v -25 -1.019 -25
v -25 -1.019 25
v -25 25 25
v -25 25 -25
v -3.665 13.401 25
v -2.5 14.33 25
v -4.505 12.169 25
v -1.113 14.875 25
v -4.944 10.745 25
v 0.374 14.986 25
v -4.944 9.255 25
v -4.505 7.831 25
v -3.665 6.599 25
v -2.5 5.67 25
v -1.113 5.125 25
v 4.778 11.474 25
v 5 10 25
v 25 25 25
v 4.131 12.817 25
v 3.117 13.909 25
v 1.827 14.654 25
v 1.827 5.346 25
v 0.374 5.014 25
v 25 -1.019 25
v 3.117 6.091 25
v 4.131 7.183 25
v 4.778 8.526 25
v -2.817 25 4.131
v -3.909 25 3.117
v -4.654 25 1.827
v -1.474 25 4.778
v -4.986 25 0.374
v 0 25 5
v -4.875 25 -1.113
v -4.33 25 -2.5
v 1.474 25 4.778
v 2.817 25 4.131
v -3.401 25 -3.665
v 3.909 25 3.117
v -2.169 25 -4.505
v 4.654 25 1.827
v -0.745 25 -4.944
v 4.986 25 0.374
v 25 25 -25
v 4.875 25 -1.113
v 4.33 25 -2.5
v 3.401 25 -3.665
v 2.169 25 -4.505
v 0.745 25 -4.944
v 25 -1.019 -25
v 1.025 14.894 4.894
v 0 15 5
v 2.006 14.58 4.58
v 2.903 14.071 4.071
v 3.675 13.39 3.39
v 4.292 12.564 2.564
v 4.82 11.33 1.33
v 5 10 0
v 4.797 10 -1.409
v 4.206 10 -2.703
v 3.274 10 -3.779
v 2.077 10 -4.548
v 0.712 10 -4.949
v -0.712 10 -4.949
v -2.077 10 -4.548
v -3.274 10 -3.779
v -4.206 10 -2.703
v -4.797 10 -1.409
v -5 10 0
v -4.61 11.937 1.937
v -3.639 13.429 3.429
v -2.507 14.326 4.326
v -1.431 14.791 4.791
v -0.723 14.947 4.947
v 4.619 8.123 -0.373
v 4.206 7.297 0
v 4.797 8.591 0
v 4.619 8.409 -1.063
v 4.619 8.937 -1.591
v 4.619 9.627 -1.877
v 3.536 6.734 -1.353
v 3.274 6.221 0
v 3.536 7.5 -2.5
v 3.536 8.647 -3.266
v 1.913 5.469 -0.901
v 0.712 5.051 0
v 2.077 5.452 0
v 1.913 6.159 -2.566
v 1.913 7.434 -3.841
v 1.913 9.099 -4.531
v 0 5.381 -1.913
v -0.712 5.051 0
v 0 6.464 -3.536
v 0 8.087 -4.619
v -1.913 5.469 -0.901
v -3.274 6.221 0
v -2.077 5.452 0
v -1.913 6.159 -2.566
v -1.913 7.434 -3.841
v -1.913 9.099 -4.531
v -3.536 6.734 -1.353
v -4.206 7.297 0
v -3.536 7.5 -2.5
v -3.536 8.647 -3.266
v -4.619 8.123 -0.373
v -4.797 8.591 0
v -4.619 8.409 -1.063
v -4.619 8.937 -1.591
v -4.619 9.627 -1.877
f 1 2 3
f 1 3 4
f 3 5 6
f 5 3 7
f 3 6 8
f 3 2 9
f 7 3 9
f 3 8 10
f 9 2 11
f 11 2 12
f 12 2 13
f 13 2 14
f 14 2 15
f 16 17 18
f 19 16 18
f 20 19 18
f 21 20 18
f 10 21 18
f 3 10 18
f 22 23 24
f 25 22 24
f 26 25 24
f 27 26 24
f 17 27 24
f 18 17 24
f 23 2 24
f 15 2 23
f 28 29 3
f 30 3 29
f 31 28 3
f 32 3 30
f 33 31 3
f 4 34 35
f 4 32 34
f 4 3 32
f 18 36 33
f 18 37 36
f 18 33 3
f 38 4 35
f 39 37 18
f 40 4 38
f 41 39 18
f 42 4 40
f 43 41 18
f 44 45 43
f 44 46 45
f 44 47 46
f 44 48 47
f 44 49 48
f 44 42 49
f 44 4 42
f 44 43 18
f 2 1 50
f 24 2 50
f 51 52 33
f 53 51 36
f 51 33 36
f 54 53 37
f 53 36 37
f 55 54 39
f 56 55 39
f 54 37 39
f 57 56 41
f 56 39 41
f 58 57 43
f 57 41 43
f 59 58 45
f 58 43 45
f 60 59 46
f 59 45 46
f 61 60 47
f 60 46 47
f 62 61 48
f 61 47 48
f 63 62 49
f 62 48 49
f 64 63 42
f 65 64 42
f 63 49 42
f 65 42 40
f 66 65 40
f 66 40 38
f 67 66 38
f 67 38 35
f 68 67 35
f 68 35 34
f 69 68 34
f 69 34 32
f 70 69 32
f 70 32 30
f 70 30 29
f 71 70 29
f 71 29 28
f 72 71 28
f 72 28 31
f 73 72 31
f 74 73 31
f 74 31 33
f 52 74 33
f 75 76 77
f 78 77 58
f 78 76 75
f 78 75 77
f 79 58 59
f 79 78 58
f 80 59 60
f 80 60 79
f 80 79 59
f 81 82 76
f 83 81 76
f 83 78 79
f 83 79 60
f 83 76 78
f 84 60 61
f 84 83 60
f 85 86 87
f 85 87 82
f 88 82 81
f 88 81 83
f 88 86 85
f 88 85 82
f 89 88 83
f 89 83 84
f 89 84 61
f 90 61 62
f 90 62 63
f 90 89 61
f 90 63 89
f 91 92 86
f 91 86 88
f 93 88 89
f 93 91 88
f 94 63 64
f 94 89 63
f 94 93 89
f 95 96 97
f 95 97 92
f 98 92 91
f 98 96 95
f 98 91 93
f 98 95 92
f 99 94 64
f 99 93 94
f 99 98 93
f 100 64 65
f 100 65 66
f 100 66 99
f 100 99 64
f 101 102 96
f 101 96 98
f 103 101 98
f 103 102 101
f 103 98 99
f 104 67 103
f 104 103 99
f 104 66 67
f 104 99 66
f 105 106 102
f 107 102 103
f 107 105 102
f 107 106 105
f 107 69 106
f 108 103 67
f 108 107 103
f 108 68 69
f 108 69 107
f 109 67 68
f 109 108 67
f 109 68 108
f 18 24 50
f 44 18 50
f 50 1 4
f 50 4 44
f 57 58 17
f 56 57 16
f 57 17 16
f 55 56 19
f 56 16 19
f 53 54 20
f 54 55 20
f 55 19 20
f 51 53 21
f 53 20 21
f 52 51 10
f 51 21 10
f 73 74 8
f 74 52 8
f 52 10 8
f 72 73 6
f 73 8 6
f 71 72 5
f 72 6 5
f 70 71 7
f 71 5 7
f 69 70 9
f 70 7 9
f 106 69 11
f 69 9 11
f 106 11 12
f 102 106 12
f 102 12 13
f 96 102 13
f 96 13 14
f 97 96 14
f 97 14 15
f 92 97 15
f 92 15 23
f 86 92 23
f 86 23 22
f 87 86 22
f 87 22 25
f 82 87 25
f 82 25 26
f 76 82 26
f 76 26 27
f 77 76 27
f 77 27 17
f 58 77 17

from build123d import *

# Parameters (mm, degrees)
BOSS_EXTRUDE1_DEPTH      = 25
BOSS_EXTRUDE1_DEPTH_BACK = 1.0186
SKETCH1_W                = 50
SKETCH1_H                = 50
SKETCH11_R               = 5
CUT_EXTRUDE17_DEPTH      = 15
SKETCH14_R               = 5
CUT_EXTRUDE18_DEPTH      = 25


with BuildPart() as part:
    # Sketch1 → Boss-Extrude1 (new, two sides: drawn at the far end of the back side and taken through both)
    with BuildSketch(Plane(origin=(0, 0, 0), x_dir=(1, 0, 0), z_dir=(0, 1, 0)).offset(-BOSS_EXTRUDE1_DEPTH_BACK)):
        Rectangle(SKETCH1_W, SKETCH1_H)
    extrude(amount=BOSS_EXTRUDE1_DEPTH + BOSS_EXTRUDE1_DEPTH_BACK)

    # Sketch10 → Cut-Revolve2 (revolve, cut)
    with BuildSketch(Plane.XY):
        with BuildLine():
            Line((-5, 10), (5, 10))
            ThreePointArc((5, 10), (0, 15), (-5, 10))
        make_face()
    revolve(axis=Axis((-5, 10, 0), (1, 0, 0)), mode=Mode.SUBTRACT)

    # Sketch11 → Cut-Extrude17 (cut)
    with BuildSketch(Plane(origin=(0, 25, 0), x_dir=(1, 0, 0), z_dir=(0, 1, 0))):
        with Locations(Location((0, 0, 0), (0, 0, 270))):
            Circle(SKETCH11_R)
    extrude(amount=-CUT_EXTRUDE17_DEPTH, mode=Mode.SUBTRACT)

    # Sketch14 → Cut-Extrude18 (cut)
    with BuildSketch(Plane.XY.offset(25)):
        with Locations((0, 10)):
            Circle(SKETCH14_R)
    extrude(amount=-CUT_EXTRUDE18_DEPTH, mode=Mode.SUBTRACT)


solid = part.part
